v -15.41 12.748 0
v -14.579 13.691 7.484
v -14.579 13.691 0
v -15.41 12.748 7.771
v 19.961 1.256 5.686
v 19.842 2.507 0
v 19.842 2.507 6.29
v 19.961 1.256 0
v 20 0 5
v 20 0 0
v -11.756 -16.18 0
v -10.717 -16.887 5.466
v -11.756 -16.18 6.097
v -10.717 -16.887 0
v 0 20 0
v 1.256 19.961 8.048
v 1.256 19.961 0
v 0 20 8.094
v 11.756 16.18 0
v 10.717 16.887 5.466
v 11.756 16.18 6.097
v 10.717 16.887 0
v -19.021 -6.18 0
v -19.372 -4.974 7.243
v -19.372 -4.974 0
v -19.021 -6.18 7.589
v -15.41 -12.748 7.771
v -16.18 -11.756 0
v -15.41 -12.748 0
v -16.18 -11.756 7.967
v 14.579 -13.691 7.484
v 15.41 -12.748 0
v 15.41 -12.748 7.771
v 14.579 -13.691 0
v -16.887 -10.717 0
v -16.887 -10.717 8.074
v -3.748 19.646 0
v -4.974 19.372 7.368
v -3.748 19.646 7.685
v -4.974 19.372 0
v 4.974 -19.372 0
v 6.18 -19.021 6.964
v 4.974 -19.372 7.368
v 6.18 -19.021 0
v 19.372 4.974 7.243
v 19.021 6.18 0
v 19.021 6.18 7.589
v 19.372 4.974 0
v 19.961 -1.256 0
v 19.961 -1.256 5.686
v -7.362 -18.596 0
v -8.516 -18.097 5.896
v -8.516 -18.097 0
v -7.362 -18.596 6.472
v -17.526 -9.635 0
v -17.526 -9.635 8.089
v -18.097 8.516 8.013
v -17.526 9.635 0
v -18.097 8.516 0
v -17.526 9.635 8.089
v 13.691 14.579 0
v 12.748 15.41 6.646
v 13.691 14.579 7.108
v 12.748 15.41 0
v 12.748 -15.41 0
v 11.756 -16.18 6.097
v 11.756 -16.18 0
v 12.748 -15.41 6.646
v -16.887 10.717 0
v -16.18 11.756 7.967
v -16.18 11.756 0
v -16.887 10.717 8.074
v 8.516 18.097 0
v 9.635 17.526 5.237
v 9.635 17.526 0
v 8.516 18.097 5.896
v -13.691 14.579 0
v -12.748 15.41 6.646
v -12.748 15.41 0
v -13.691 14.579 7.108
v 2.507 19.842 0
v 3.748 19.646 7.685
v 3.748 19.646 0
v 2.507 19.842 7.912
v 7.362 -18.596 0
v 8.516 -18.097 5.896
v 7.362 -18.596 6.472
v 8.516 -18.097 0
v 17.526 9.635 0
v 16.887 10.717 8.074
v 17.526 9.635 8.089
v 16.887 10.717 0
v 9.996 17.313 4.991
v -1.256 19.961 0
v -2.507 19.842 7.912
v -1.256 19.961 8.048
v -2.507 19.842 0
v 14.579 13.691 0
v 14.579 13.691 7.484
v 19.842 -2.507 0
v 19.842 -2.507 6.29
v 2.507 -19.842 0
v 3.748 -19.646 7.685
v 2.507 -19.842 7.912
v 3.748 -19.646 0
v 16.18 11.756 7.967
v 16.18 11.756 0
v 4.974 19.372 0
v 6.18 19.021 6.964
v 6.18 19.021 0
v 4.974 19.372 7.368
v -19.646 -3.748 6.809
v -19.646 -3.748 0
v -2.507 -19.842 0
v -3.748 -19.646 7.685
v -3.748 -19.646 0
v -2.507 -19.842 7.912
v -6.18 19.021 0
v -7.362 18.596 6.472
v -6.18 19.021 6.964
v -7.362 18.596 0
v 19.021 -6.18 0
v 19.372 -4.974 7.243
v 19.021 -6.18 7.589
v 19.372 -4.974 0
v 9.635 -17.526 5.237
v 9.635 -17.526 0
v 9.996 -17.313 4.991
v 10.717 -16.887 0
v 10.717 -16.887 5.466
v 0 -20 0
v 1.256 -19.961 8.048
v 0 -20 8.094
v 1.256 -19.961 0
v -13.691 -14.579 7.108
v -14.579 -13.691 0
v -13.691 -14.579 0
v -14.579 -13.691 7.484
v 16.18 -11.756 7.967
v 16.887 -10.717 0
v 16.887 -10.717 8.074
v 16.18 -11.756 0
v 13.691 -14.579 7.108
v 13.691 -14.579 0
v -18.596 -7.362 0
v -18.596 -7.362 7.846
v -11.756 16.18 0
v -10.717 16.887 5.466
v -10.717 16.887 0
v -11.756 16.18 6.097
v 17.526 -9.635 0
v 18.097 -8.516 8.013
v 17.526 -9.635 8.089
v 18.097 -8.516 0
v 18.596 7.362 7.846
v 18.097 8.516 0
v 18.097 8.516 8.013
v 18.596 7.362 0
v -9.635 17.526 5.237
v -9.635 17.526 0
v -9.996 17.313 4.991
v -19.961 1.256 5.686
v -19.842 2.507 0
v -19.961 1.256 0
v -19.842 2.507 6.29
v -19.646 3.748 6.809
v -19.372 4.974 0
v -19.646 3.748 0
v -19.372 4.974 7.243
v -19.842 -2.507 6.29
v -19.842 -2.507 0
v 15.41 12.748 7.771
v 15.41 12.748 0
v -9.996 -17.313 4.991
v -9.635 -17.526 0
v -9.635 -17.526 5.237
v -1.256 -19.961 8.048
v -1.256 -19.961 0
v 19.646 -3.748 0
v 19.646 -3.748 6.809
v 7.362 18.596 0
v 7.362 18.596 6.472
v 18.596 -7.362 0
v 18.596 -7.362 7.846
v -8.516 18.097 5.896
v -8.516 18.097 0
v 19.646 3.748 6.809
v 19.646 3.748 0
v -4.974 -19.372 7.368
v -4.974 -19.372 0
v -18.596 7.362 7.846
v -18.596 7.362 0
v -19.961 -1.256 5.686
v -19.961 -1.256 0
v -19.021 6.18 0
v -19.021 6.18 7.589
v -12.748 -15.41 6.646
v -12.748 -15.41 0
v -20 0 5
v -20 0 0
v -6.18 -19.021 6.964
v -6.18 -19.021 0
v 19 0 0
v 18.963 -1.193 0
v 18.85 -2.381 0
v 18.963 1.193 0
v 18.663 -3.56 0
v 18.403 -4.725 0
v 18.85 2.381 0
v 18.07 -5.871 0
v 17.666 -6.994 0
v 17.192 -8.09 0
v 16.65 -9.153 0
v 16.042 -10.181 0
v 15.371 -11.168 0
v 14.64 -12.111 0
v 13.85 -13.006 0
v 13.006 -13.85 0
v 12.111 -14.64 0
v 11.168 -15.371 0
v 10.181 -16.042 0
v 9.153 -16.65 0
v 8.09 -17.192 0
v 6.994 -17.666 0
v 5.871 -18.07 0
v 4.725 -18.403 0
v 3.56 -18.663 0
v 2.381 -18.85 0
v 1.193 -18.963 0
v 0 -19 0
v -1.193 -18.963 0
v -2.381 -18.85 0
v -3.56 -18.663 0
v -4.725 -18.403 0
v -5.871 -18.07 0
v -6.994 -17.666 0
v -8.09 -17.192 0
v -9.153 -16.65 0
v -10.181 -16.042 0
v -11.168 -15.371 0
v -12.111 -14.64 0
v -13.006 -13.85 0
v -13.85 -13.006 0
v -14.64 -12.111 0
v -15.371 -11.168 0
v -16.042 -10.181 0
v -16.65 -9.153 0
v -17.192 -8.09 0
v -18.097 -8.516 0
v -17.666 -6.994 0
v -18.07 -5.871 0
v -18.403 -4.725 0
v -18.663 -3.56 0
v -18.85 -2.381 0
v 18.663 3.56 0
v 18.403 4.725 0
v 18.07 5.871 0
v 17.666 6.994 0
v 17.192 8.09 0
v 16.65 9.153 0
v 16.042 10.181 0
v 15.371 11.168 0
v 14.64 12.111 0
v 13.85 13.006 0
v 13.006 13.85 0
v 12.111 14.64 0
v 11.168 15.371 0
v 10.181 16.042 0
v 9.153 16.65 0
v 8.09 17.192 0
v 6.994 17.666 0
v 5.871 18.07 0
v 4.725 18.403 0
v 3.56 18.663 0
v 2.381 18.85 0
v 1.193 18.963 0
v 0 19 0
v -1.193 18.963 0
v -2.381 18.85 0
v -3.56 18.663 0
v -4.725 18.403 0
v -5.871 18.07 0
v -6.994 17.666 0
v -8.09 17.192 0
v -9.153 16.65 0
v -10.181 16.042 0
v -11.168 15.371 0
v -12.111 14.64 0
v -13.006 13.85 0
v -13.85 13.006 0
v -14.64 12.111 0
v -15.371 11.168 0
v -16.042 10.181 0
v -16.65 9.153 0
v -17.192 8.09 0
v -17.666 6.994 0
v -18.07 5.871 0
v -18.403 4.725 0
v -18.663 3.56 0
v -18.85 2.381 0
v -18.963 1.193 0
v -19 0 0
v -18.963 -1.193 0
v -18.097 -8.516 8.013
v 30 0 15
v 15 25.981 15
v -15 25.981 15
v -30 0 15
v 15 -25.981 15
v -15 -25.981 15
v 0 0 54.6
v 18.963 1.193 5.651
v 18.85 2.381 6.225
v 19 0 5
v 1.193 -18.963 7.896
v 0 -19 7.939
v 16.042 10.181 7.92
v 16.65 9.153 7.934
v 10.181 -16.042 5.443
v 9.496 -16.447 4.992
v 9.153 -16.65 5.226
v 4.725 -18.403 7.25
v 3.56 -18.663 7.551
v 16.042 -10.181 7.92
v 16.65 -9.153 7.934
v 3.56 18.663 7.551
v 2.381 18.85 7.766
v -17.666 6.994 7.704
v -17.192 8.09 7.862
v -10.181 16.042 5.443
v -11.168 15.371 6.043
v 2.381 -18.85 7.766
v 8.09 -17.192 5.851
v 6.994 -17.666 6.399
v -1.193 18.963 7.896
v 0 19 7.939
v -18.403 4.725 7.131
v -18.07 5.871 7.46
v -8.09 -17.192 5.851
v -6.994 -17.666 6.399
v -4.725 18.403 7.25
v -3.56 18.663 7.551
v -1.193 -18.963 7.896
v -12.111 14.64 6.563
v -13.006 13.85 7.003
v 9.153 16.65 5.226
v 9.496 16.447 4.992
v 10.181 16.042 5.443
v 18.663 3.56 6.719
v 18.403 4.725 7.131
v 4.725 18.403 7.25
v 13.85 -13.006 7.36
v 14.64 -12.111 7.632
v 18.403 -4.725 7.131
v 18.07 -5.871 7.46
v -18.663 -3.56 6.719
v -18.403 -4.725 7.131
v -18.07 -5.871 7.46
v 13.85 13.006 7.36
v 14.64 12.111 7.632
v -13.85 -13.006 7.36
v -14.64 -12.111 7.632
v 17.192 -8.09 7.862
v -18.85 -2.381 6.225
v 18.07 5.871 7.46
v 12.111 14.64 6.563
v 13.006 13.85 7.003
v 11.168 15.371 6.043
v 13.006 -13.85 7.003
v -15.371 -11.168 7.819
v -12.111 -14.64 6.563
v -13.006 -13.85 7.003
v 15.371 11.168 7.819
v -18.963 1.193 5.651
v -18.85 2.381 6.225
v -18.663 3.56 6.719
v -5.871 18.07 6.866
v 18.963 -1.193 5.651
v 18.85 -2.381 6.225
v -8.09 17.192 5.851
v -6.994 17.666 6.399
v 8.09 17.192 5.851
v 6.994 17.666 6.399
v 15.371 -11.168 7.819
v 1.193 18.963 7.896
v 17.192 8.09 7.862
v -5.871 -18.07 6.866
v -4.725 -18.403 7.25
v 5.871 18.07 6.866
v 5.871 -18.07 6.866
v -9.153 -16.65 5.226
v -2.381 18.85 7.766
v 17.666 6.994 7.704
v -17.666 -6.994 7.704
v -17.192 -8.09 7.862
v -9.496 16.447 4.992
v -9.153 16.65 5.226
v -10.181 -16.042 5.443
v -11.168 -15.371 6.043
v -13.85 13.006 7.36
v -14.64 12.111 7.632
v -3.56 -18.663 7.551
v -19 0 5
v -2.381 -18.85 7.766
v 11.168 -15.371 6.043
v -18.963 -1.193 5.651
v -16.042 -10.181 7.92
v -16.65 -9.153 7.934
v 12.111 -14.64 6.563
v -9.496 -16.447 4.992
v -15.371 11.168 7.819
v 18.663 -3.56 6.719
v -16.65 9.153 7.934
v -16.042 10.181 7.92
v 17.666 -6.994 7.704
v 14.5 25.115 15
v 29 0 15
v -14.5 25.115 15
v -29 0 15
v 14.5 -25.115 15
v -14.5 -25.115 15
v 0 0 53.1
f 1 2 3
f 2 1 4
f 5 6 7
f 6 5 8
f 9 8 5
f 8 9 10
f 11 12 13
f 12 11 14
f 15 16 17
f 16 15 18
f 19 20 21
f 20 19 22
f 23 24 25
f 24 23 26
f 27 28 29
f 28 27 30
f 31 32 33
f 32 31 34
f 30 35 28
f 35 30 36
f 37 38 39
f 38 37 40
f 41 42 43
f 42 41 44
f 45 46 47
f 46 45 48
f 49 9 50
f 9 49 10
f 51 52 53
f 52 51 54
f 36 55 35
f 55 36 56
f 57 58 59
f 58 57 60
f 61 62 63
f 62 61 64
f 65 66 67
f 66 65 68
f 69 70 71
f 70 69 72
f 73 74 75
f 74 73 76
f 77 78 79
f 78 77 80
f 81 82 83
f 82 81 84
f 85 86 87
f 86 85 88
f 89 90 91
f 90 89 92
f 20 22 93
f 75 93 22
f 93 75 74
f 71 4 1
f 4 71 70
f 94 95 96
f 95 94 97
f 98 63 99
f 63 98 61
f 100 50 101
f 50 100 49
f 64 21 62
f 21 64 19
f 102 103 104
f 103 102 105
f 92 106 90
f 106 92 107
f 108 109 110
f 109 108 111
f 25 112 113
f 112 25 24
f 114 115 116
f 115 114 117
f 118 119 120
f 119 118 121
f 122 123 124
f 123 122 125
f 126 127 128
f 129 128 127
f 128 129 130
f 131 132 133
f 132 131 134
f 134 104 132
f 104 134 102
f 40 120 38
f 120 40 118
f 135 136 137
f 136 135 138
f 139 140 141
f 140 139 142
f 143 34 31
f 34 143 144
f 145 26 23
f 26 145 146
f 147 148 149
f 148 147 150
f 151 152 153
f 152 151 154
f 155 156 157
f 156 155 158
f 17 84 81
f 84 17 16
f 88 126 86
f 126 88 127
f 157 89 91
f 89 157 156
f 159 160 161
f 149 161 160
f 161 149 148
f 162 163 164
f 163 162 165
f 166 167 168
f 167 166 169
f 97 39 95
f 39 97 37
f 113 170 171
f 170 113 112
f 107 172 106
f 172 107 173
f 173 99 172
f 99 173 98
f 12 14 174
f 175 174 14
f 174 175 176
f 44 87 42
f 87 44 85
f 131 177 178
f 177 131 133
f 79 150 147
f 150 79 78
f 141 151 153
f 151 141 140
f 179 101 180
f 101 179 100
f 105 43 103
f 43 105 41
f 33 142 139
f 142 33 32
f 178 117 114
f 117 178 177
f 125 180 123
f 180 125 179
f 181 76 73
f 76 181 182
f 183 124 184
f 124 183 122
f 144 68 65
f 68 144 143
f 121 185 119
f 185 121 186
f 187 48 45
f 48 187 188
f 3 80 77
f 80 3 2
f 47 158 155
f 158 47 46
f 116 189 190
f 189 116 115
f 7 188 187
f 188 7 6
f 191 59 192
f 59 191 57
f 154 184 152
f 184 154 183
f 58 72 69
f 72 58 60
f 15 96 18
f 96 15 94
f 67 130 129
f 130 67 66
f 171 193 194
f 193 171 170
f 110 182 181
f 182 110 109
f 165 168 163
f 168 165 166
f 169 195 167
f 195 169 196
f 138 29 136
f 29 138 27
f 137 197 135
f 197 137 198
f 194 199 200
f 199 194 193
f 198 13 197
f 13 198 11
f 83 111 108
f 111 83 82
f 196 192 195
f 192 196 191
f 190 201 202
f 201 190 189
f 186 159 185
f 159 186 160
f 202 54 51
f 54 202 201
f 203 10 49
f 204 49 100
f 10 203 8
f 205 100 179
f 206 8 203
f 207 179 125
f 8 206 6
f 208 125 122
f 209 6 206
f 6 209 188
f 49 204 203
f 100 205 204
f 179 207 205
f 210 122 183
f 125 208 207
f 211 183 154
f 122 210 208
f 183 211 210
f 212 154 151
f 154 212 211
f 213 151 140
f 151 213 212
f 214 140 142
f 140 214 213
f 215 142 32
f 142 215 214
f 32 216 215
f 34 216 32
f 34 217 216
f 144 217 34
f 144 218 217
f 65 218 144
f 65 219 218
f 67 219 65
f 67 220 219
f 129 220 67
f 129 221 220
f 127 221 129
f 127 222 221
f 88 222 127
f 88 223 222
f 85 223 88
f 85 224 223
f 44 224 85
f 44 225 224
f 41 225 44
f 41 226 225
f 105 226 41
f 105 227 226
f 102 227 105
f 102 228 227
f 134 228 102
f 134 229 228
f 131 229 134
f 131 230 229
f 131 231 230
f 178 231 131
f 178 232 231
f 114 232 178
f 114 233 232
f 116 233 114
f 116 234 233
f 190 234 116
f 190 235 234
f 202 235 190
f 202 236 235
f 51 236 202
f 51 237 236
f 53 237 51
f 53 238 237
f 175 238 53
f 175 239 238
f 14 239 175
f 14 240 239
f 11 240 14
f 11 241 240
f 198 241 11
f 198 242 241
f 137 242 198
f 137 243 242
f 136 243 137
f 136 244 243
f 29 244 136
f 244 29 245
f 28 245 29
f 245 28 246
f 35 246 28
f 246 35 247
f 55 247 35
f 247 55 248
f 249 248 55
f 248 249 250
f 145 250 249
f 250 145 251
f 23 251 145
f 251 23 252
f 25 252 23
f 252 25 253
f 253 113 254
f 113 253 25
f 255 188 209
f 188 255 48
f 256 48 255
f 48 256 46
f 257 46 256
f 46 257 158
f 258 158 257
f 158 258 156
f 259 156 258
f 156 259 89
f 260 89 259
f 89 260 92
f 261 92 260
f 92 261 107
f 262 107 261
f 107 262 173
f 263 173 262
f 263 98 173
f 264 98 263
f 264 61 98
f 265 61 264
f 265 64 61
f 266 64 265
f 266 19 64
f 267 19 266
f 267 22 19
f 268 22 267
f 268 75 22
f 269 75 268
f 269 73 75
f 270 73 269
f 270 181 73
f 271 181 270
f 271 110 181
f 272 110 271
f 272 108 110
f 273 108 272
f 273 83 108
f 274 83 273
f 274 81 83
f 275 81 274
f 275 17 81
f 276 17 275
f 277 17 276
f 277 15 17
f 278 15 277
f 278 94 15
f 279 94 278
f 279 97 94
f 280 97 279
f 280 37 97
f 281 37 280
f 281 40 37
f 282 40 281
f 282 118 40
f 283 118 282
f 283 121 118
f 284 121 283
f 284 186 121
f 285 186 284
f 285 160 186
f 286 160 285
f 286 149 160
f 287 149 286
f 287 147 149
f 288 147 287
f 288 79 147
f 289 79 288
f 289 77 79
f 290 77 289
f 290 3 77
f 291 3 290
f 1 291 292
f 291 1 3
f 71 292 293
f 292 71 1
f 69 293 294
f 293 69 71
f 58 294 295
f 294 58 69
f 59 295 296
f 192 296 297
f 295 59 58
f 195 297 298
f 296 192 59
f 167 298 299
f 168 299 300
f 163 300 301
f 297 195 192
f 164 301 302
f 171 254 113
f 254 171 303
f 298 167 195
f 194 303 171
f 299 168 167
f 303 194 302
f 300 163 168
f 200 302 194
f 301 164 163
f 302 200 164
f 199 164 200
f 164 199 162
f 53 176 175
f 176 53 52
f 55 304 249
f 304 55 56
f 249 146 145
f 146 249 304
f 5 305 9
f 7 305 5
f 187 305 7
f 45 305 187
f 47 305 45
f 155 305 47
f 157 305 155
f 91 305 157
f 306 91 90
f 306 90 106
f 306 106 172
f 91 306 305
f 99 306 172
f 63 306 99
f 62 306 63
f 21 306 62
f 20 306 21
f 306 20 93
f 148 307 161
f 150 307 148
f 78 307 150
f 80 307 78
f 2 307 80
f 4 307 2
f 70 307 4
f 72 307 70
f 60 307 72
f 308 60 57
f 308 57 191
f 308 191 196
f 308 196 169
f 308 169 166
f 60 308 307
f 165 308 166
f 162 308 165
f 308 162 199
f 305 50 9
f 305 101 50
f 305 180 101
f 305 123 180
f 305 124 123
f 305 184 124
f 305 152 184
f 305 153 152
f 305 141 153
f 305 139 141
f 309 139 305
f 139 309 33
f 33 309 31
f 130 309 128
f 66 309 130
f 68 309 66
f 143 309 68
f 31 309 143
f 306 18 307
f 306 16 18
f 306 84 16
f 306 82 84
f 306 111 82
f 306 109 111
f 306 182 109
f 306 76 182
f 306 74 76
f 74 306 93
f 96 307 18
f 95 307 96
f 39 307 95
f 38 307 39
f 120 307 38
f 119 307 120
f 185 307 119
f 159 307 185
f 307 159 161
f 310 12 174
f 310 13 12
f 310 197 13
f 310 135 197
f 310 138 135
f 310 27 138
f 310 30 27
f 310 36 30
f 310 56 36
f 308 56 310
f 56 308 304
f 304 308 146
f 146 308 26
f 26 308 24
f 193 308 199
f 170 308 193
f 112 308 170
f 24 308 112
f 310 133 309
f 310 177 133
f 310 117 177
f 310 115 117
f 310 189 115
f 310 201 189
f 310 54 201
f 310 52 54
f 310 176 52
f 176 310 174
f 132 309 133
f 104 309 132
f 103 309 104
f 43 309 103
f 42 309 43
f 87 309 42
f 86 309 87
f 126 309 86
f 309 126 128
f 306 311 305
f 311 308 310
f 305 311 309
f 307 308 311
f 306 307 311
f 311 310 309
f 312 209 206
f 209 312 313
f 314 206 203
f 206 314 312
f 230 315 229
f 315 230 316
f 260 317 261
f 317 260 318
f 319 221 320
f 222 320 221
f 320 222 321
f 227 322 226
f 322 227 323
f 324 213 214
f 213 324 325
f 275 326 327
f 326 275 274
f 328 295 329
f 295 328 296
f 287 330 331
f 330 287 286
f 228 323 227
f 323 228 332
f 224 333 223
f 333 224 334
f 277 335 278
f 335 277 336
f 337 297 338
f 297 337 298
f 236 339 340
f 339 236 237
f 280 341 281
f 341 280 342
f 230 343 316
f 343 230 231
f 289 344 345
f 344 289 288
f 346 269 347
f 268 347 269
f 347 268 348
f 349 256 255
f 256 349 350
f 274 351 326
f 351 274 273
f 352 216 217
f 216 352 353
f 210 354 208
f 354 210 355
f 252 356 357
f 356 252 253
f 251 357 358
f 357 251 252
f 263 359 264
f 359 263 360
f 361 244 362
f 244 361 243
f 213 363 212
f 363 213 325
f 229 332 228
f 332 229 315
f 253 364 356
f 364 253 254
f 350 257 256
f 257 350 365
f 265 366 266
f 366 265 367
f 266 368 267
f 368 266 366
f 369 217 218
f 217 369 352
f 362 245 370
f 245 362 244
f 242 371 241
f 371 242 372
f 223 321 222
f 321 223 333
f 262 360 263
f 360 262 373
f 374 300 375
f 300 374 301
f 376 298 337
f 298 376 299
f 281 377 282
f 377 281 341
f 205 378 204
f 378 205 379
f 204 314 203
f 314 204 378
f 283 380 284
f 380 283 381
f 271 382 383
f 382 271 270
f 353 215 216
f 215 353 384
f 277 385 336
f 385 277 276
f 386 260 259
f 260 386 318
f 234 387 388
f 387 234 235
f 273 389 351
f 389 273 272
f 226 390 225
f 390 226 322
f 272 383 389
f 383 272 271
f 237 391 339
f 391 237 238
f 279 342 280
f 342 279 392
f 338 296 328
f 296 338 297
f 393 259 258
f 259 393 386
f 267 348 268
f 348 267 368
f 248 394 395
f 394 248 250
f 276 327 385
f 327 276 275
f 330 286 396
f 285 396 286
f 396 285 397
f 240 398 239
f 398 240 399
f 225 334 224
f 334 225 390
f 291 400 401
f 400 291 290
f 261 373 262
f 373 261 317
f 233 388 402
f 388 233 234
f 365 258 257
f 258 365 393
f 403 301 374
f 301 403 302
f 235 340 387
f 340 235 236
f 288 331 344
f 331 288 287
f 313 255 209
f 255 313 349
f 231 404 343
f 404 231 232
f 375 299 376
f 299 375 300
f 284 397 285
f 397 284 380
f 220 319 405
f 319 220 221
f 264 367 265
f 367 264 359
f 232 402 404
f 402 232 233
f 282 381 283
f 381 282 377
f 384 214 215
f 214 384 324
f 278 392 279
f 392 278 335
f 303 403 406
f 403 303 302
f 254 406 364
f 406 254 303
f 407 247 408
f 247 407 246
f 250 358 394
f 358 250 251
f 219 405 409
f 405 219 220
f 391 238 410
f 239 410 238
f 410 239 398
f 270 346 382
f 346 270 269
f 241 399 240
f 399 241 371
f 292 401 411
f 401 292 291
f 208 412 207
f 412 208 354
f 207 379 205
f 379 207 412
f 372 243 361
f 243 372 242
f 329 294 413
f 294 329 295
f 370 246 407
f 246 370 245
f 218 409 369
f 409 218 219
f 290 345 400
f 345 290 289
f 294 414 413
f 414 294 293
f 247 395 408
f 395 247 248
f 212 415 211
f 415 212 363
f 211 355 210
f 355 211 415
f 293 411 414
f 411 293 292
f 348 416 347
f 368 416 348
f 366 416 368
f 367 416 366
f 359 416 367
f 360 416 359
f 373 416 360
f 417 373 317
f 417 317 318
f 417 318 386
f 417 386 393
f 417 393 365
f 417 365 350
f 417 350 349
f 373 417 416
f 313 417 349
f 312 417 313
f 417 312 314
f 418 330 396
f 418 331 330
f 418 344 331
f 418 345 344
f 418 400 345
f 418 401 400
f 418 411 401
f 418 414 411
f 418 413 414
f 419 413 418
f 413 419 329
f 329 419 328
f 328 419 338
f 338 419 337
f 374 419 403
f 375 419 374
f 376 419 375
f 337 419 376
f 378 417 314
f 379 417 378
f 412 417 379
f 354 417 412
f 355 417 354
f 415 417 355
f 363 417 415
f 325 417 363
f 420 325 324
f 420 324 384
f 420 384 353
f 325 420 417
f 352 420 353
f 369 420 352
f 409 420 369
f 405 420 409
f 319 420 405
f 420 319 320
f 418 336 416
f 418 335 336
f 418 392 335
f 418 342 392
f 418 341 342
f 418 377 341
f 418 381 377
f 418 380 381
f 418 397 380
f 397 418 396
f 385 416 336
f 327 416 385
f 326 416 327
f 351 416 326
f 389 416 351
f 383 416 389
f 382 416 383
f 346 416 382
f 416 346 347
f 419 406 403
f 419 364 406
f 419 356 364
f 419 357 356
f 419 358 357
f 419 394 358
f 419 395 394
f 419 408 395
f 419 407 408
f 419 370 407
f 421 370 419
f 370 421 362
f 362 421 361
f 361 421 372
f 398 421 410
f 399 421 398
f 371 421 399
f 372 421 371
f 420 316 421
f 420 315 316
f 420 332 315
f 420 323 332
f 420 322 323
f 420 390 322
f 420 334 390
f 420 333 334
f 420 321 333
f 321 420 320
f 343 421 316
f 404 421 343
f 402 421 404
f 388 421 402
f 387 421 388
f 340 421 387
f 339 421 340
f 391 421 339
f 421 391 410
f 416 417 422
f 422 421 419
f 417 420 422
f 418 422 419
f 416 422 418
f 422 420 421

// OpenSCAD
//Make EPIC custom crystal lamps

//https://www.youtube.com/watch?v=HZKu9QMN5xw&ab_channel=bigclivedotcom

//Lamp cap diamond.
//You can adjust the five variables below
base=40;      //Diameter of base for lamp
rim=5;            //Length of rim at base
size=60;        //Size of diamond
facets=6;       //Number of sides (default 6)
scaling=0.66; //Ratio of length to width (default 0.66)
//Don't change variables below here
halfsize=size/2;
$fn=facets;
difference(){
union(){
//outer body
translate([0,0,0])
cylinder(h=4+rim,d1=base,d2=base,$fn=100);
translate([0,0,-(base/2)+rim])
cylinder(h=halfsize,d1=0,d2=size);
translate([0,0,halfsize-(base/2)+rim])
cylinder(h=size*scaling,d1=size,d2=0);
}
//Inner core.
translate([0,0,-1])
cylinder(h=6+rim,d1=base-2,d2=base-2,$fn=100);
translate([0,0,-(base/2)+rim+1])
cylinder(h=halfsize-1,d1=0,d2=size-2);
translate([0,0,halfsize-(base/2)+rim])
cylinder(h=size*scaling-1.5,d1=size-2,d2=0);
translate([-halfsize,-halfsize,-halfsize])
cube([size,size,halfsize]);
//x-ray box
//translate([-80,-80,-50])
//cube([160,80,260]);
}
